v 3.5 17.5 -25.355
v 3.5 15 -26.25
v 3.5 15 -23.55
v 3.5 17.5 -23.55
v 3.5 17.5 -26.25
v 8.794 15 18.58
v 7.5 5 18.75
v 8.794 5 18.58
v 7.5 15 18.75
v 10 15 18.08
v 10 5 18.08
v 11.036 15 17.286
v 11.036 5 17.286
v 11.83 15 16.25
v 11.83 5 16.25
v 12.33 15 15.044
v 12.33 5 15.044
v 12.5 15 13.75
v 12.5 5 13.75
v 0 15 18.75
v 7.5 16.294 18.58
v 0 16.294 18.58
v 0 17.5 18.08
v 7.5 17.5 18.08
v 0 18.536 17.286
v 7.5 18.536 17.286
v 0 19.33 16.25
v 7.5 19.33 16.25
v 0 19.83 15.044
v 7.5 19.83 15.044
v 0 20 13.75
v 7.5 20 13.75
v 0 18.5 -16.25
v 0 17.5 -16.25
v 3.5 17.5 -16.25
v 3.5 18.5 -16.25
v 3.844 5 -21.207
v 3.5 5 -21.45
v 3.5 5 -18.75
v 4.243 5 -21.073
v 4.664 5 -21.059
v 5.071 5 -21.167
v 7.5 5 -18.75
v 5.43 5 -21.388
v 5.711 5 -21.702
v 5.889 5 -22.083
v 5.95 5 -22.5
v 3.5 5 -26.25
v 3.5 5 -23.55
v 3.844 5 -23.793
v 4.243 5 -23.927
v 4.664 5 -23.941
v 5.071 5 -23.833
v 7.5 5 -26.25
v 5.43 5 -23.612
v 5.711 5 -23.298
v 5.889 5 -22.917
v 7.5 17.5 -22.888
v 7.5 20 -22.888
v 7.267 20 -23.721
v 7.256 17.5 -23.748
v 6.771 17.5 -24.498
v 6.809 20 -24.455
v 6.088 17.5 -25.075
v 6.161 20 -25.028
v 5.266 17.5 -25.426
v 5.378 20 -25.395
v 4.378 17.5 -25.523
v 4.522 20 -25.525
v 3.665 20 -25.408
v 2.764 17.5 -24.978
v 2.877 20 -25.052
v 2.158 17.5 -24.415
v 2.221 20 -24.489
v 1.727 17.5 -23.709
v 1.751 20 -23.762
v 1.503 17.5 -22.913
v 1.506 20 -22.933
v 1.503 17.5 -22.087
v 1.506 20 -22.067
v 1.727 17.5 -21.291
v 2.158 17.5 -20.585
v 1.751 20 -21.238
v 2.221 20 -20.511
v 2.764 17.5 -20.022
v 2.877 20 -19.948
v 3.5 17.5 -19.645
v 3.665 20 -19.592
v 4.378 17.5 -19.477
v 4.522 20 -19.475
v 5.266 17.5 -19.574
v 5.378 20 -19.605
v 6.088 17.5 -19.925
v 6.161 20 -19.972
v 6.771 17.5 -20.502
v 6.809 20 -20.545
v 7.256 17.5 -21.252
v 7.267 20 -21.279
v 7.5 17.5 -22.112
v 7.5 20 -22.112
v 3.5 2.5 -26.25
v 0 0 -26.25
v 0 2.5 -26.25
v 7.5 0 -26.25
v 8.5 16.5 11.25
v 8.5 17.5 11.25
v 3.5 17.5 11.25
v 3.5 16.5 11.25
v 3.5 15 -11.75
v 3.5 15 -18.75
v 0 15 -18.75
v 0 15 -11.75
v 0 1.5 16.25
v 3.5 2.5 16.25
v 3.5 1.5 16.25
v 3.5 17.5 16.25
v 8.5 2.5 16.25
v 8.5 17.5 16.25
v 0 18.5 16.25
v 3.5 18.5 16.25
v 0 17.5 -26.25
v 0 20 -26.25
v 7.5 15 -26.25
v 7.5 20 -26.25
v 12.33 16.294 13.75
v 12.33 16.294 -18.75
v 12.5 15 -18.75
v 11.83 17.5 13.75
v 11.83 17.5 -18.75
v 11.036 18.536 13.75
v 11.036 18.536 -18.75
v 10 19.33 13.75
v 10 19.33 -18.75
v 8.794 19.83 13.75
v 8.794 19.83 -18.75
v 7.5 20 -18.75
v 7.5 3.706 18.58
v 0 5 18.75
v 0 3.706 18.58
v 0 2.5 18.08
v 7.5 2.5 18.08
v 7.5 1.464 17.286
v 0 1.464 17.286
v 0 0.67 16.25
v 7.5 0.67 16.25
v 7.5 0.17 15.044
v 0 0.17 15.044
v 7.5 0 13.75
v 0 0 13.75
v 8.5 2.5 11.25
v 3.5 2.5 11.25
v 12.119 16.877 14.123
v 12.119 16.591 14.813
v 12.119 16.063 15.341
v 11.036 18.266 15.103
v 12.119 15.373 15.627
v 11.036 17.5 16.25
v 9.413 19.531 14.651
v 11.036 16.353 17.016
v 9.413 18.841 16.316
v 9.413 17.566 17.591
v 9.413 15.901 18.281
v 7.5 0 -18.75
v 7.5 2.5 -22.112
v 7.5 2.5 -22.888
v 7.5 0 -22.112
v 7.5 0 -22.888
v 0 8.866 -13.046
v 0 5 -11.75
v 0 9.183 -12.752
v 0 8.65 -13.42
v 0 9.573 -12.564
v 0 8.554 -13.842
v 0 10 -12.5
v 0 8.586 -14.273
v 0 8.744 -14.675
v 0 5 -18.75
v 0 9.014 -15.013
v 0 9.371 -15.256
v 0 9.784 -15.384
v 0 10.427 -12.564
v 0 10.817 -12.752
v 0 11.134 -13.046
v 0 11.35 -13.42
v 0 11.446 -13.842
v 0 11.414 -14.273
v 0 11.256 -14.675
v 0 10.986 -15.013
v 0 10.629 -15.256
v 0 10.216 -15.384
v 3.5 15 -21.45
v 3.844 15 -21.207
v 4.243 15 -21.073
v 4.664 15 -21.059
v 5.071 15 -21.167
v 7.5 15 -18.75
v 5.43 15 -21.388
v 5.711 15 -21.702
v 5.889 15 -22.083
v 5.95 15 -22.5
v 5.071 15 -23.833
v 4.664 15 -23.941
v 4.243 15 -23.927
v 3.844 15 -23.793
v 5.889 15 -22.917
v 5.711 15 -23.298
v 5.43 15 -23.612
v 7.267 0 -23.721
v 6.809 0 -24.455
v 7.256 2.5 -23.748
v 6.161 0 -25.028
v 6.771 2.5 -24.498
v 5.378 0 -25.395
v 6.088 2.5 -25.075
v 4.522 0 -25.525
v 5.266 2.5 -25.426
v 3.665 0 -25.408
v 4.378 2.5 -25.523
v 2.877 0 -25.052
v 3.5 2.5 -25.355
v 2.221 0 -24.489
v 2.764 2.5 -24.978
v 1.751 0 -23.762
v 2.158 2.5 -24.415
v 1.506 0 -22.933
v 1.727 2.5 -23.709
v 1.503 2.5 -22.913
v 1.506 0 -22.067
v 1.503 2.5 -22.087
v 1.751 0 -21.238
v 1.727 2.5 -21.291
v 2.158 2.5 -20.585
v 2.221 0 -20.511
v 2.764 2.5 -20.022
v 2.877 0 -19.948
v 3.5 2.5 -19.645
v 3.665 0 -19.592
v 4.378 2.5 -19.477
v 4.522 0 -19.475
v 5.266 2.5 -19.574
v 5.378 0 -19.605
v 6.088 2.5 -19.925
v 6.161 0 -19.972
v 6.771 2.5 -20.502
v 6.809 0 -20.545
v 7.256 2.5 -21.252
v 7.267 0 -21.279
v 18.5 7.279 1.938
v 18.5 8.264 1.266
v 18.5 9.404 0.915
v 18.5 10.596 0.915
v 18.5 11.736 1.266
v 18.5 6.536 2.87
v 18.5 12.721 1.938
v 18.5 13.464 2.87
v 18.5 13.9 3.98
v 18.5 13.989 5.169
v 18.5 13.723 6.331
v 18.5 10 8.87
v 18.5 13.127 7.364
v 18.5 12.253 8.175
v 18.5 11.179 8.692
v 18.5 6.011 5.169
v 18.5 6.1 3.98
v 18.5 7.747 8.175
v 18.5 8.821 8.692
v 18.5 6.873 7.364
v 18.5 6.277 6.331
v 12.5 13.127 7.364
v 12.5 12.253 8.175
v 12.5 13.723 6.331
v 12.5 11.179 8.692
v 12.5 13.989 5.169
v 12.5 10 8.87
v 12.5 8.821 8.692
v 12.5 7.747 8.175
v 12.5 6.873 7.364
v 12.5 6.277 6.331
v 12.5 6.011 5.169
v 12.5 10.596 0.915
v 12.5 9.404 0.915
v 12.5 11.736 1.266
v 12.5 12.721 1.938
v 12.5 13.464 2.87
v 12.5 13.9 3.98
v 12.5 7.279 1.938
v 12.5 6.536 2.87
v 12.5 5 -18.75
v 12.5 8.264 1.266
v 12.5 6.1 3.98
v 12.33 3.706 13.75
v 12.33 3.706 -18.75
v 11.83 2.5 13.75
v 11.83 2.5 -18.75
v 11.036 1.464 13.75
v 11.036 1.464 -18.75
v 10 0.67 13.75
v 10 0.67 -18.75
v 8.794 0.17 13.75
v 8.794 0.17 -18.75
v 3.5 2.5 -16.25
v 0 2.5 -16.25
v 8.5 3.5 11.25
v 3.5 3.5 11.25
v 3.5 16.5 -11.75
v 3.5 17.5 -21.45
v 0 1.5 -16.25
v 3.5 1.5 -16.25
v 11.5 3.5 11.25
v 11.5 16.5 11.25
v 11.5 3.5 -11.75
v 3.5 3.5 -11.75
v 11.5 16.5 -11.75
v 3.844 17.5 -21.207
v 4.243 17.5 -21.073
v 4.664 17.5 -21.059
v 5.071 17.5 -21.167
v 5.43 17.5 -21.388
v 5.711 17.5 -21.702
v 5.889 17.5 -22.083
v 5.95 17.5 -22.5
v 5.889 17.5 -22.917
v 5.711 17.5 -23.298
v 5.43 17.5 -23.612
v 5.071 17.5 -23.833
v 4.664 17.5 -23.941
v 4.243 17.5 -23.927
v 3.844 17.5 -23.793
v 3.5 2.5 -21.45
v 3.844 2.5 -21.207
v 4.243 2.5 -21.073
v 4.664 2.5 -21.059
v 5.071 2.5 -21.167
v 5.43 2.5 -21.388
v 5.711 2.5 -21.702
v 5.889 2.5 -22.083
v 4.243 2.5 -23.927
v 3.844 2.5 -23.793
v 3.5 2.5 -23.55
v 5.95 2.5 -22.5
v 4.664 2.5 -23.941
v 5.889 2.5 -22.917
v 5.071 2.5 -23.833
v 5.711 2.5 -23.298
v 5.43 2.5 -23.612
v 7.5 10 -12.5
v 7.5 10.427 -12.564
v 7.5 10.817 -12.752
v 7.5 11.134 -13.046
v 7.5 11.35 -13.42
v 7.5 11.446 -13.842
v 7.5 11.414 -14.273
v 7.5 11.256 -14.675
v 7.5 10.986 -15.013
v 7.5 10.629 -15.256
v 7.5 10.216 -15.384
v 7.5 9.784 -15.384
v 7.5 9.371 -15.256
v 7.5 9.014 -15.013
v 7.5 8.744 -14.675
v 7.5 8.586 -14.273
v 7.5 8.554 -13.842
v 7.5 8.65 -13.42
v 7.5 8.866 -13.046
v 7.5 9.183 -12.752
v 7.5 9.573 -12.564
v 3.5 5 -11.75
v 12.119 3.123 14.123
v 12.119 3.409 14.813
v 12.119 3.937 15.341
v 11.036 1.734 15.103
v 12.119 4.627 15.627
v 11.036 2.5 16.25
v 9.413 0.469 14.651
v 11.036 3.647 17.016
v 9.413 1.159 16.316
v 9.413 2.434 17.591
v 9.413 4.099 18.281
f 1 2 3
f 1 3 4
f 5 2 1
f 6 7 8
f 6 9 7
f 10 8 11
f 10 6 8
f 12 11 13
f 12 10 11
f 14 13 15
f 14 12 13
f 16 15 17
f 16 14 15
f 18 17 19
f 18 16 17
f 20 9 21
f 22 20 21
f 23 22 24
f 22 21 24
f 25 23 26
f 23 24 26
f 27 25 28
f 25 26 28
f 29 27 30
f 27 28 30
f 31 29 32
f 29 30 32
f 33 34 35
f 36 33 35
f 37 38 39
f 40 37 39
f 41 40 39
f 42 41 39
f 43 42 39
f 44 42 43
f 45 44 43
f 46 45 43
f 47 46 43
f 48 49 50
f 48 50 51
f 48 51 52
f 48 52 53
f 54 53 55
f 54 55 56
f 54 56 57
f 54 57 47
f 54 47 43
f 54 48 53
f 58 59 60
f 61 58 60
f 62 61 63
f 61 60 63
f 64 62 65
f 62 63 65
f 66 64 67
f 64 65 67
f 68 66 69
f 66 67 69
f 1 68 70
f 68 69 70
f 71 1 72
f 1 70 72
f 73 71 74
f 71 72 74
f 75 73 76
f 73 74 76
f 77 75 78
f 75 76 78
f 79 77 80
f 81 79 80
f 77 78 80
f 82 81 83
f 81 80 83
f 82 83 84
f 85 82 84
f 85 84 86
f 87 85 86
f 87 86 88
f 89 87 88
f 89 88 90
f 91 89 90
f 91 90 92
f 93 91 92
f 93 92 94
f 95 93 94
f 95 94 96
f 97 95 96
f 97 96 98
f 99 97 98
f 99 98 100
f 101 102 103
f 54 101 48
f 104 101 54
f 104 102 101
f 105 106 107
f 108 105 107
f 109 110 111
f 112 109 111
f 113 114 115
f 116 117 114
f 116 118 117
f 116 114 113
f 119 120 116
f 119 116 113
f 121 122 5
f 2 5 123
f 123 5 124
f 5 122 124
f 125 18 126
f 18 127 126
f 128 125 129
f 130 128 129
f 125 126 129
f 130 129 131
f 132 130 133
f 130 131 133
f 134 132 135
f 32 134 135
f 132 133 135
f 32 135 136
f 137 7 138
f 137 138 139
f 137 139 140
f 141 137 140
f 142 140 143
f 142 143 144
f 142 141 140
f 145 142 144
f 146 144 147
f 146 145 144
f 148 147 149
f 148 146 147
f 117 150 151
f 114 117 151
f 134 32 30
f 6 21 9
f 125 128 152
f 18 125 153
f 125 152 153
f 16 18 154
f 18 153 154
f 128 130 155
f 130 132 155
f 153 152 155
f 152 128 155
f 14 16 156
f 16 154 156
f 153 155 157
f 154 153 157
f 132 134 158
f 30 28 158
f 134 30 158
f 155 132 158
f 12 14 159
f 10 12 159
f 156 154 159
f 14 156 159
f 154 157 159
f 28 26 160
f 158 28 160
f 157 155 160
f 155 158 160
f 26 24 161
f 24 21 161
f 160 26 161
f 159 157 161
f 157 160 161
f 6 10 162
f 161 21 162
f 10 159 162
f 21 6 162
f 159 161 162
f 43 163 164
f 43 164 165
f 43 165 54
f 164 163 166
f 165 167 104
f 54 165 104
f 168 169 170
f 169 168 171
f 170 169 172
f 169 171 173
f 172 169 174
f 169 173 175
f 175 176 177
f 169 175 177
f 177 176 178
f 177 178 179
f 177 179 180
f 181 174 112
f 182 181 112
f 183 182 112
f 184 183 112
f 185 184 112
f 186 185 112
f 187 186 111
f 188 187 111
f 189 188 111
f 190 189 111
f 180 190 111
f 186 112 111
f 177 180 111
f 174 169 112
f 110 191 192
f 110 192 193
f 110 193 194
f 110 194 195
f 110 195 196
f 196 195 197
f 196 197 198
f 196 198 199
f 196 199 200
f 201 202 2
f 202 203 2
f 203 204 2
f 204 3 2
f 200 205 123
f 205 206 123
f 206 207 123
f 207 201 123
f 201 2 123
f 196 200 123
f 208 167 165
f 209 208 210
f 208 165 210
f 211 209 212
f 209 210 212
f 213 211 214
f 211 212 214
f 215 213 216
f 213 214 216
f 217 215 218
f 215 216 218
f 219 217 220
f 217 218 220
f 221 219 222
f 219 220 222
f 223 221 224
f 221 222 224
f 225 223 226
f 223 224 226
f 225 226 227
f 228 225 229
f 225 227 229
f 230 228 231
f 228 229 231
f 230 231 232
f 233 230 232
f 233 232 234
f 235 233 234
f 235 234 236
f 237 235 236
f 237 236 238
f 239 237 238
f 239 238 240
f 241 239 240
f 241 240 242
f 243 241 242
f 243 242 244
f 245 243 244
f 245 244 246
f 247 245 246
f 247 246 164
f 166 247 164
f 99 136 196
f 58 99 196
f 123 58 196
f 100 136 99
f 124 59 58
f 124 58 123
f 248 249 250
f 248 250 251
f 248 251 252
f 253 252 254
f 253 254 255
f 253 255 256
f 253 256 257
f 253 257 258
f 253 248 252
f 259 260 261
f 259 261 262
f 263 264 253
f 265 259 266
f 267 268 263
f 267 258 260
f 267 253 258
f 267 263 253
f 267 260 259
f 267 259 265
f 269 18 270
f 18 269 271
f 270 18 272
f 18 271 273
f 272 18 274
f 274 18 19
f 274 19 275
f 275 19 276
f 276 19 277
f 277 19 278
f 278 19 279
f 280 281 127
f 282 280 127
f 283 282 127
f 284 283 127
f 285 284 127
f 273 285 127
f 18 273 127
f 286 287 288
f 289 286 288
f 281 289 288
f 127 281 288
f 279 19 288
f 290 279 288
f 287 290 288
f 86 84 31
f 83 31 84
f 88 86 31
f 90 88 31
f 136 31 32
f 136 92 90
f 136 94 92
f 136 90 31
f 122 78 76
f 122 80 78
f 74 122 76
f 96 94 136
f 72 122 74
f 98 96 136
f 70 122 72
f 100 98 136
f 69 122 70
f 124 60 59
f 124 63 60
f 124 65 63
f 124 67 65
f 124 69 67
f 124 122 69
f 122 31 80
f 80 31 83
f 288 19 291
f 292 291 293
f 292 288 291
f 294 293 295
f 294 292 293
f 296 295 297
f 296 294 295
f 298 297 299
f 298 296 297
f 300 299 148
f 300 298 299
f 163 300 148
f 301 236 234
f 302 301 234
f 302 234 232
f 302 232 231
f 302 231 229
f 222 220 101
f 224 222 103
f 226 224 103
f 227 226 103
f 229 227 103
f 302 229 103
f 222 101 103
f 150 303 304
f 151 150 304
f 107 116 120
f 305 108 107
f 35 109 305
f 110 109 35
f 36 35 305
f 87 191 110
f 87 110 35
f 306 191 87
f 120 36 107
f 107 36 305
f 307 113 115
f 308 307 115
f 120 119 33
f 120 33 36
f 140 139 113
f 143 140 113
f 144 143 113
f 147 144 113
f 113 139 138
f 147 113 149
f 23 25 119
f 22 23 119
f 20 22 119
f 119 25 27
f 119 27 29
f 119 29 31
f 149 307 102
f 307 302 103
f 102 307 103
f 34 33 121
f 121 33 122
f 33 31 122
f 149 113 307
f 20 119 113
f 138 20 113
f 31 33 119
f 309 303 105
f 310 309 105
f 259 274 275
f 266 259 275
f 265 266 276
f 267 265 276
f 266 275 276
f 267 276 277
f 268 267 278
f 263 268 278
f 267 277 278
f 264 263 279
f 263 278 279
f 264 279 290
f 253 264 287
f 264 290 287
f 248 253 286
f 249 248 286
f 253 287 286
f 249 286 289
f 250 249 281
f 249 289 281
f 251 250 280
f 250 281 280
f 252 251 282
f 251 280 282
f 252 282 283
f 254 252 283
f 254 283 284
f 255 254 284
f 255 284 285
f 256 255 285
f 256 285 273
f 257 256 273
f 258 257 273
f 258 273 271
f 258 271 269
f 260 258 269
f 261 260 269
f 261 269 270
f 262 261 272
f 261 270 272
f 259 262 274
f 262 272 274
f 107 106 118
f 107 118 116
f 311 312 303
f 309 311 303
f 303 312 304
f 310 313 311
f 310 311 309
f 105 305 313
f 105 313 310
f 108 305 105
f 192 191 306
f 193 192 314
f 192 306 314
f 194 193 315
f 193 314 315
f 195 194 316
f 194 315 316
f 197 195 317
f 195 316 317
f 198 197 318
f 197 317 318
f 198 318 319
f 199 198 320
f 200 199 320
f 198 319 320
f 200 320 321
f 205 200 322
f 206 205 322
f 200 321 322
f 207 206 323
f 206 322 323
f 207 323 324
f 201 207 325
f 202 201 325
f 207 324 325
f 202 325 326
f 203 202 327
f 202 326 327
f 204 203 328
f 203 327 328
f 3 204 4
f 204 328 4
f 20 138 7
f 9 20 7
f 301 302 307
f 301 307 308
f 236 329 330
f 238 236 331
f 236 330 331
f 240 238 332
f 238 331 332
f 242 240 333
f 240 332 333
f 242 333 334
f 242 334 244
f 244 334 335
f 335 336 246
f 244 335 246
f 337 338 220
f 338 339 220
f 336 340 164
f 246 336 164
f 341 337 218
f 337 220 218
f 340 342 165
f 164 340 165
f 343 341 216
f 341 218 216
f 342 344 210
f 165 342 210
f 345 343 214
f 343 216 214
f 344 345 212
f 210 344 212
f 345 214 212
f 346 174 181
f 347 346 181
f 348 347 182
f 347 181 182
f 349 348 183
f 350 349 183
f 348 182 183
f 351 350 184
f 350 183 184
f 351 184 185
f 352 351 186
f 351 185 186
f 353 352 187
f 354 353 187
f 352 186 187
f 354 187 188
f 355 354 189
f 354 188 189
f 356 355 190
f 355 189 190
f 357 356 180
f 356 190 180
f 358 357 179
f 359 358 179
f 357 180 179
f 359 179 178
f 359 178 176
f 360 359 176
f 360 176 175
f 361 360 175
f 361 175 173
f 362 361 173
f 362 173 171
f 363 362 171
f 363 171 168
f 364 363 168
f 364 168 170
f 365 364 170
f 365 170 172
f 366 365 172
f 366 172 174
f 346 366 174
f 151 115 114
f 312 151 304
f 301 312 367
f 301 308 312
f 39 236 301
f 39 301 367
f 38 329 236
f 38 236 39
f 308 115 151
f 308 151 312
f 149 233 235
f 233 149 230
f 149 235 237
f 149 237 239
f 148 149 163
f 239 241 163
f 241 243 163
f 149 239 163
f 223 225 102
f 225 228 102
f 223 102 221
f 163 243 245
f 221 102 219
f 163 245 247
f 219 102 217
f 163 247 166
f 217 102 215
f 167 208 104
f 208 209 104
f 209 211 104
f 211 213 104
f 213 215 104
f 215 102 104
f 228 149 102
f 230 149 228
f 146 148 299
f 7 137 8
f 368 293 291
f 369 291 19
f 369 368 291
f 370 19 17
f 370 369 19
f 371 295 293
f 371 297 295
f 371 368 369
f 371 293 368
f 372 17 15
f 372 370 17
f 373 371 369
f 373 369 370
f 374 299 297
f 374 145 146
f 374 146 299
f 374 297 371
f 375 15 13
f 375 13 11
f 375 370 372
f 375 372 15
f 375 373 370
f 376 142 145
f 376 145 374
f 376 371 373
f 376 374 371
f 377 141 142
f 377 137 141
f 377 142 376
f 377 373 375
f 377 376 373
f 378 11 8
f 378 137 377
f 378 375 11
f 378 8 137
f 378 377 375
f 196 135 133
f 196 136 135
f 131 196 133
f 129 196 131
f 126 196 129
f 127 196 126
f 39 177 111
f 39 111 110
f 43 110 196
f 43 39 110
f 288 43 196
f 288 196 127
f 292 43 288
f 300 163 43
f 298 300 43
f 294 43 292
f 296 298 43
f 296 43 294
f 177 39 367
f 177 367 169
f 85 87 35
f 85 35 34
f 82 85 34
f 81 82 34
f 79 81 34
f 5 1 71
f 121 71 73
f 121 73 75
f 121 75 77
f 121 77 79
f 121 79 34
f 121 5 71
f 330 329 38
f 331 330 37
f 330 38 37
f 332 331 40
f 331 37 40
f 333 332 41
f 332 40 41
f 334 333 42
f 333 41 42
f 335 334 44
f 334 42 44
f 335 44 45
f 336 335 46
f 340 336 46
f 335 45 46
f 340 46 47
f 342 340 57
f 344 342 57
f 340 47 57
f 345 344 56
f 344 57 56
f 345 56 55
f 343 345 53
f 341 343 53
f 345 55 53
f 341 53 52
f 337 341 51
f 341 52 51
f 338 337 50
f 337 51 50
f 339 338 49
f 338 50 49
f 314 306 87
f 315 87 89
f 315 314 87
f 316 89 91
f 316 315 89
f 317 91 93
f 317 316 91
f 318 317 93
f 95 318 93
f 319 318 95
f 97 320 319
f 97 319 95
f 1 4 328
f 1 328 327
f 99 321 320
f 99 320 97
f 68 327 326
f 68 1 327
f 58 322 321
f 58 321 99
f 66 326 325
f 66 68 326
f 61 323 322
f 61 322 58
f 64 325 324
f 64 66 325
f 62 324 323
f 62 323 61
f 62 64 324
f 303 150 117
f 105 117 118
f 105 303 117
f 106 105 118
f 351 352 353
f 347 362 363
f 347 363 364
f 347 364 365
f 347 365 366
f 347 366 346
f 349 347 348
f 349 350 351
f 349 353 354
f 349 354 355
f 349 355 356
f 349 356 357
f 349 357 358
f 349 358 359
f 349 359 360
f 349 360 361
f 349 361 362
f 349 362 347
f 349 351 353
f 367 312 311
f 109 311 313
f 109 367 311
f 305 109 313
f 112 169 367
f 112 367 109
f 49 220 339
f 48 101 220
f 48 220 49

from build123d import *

# Parameters (mm, degrees)
SKETCH_1_W           = 25
SKETCH_1_H           = 37.5
EXTRUDE_1_DEPTH      = 20
FILLET_1_R           = 5
SKETCH_2_W           = 15
SKETCH_2_H           = 7.5
EXTRUDE_2_DEPTH      = 5
EXTRUDE_START        = -20
SKETCH_2_2_W         = 15
SKETCH_2_2_H         = 7.5
EXTRUDE_3_DEPTH      = 5
SKETCH_3_R           = 1.45
CUT_EXTRUDE_1_DEPTH  = 20
SKETCH_4_R           = 3.025
CUT_EXTRUDE_3_DEPTH  = 2.5
CUT_EXTRUDE_START    = -17.5
SKETCH_4_2_R         = 3.025
CUT_EXTRUDE_4_DEPTH  = 2.5
SKETCH_5_W           = 33
SKETCH_5_H           = 13
CUT_EXTRUDE_5_DEPTH  = 5.5
SKETCH_6_W           = 23
SKETCH_6_H           = 13
CUT_EXTRUDE_6_DEPTH  = 18.5
SKETCH_7_R           = 1.45
CUT_EXTRUDE_7_DEPTH  = 14.5
SKETCH_8_W           = 7
SKETCH_8_H           = 2.5
CUT_EXTRUDE_8_DEPTH  = 42.5
SKETCH_9_W           = 12
SKETCH_9_H           = 15
CUT_EXTRUDE_9_DEPTH  = 5
SKETCH_10_W          = 7
SKETCH_10_H          = 32.5
CUT_EXTRUDE_10_DEPTH = 1
CUT_EXTRUDE_START_2  = 15
SKETCH_10_2_W        = 7
SKETCH_10_2_H        = 32.5
CUT_EXTRUDE_11_DEPTH = 1
CUT_EXTRUDE_12_REACH = 40.332
SKETCH_11_R          = 3
SKETCH_12_R          = 4
EXTRUDE_4_DEPTH      = 6
SKETCH_13_W          = 15.131342966
SKETCH_13_H          = 46.669139603
CUT_EXTRUDE_13_DEPTH = 23


with BuildPart() as part:
    # Эскиз1 → Бобышка-Вытянуть1 (new body)
    with BuildSketch(Plane(origin=(0, 0, 0), x_dir=(1, 0, 0), z_dir=(0, 1, 0))):
        Rectangle(SKETCH_1_W, SKETCH_1_H)
    extrude(amount=EXTRUDE_1_DEPTH)

    # Скругление1
    fillet_1_edges = [part.edges().sort_by_distance(p)[0] for p in [
        (-12.5, 20, 0),
        (0, 20, 18.75),
        (12.5, 20, 0),
        (0, 0, 18.75),
        (-12.5, 0, 0),
        (12.5, 0, 0),
        (12.5, 10, 18.75),
        (-12.5, 10, 18.75),
    ]]
    fillet(fillet_1_edges, radius=FILLET_1_R)

    # Эскиз2 → Бобышка-Вытянуть2 (add)
    with BuildSketch(Plane(origin=(0, 20, 0), x_dir=(1, 0, 0), z_dir=(0, 1, 0))):
        with Locations((0, 22.5)):
            Rectangle(SKETCH_2_W, SKETCH_2_H)
    extrude(amount=-EXTRUDE_2_DEPTH)

    # Эскиз2<2> → Бобышка-Вытянуть3 (add)
    with BuildSketch(Plane(origin=(0, 20, 0), x_dir=(1, 0, 0), z_dir=(0, 1, 0)).offset(EXTRUDE_START)):
        with Locations((0, 22.5)):
            Rectangle(SKETCH_2_2_W, SKETCH_2_2_H)
    extrude(amount=EXTRUDE_3_DEPTH)

    # Эскиз3 → Вырез-Вытянуть1 (cut)
    with BuildSketch(Plane(origin=(0, 20, 0), x_dir=(1, 0, 0), z_dir=(0, 1, 0))):
        with Locations(Location((-4.5, 22.5, 0), (0, 0, 270))):
            Circle(SKETCH_3_R)
        with Locations(Location((4.5, 22.5, 0), (0, 0, 270))):
            Circle(SKETCH_3_R)
    extrude(amount=-CUT_EXTRUDE_1_DEPTH, mode=Mode.SUBTRACT)

    # Эскиз4 → Вырез-Вытянуть3 (cut)
    with BuildSketch(Plane(origin=(0, 20, 0), x_dir=(1, 0, 0), z_dir=(0, 1, 0))):
        with Locations((-4.5, 22.5)):
            Circle(SKETCH_4_R)
        with Locations((4.5, 22.5)):
            Circle(SKETCH_4_R)
    extrude(amount=-CUT_EXTRUDE_3_DEPTH, mode=Mode.SUBTRACT)

    # Эскиз4<2> → Вырез-Вытянуть4 (cut)
    with BuildSketch(Plane(origin=(0, 20, 0), x_dir=(1, 0, 0), z_dir=(0, 1, 0)).offset(CUT_EXTRUDE_START)):
        with Locations((-4.5, 22.5)):
            Circle(SKETCH_4_2_R)
        with Locations((4.5, 22.5)):
            Circle(SKETCH_4_2_R)
    extrude(amount=-CUT_EXTRUDE_4_DEPTH, mode=Mode.SUBTRACT)

    # Эскиз5 → Вырез-Вытянуть5 (cut)
    with BuildSketch(Plane.ZY.offset(12.5)):
        with Locations((-0.25, 10)):
            Rectangle(SKETCH_5_W, SKETCH_5_H)
    extrude(amount=-CUT_EXTRUDE_5_DEPTH, mode=Mode.SUBTRACT)

    # Эскиз6 → Вырез-Вытянуть6 (cut)
    with BuildSketch(Plane.ZY.offset(7)):
        with Locations((-0.25, 10)):
            Rectangle(SKETCH_6_W, SKETCH_6_H)
    extrude(amount=-CUT_EXTRUDE_6_DEPTH, mode=Mode.SUBTRACT)

    # Эскиз7 → Вырез-Вытянуть7 (cut)
    with BuildSketch(Plane.ZY.offset(7)):
        with Locations((-13.95, 10)):
            Circle(SKETCH_7_R)
        with Locations((13.45, 10)):
            Circle(SKETCH_7_R)
    extrude(amount=-CUT_EXTRUDE_7_DEPTH, mode=Mode.SUBTRACT)

    # Эскиз8 → Вырез-Вытянуть8 (cut)
    with BuildSketch(Plane(origin=(0, 0, -26.25), x_dir=(-1, 0, 0), z_dir=(0, 0, -1))):
        with Locations((0, 16.25)):
            Rectangle(SKETCH_8_W, SKETCH_8_H)
        with Locations((0, 3.75)):
            Rectangle(SKETCH_8_W, SKETCH_8_H)
    extrude(amount=-CUT_EXTRUDE_8_DEPTH, mode=Mode.SUBTRACT)

    # Эскиз9 → Вырез-Вытянуть9 (cut)
    with BuildSketch(Plane(origin=(0, 0, 11.25), x_dir=(-1, 0, 0), z_dir=(0, 0, -1))):
        with Locations((-2.5, 10)):
            Rectangle(SKETCH_9_W, SKETCH_9_H)
    extrude(amount=-CUT_EXTRUDE_9_DEPTH, mode=Mode.SUBTRACT)

    # Эскиз10 → Вырез-Вытянуть10 (cut)
    with BuildSketch(Plane.XZ.offset(-17.5)):
        Rectangle(SKETCH_10_W, SKETCH_10_H)
    extrude(amount=-CUT_EXTRUDE_10_DEPTH, mode=Mode.SUBTRACT)

    # Эскиз10<2> → Вырез-Вытянуть11 (cut)
    with BuildSketch(Plane.XZ.offset(-17.5).offset(CUT_EXTRUDE_START_2)):
        Rectangle(SKETCH_10_2_W, SKETCH_10_2_H)
    extrude(amount=CUT_EXTRUDE_11_DEPTH, mode=Mode.SUBTRACT)

    # Вырез-Вытянуть12: up to this face of the body (flat: up to its plane)
    cut_extrude_12_end = Plane(part.part.faces().sort_by_distance((-12.5, 10, -17.75))[0])
    # Эскиз11 → Вырез-Вытянуть12 (cut, up to the picked face)
    with BuildSketch(Plane.ZY.offset(7), mode=Mode.PRIVATE) as cut_extrude_12_sk1:
        with Locations((-13.95, 10)):
            Circle(SKETCH_11_R)
    cut_extrude_12_tool1 = split(extrude(cut_extrude_12_sk1.sketch, amount=CUT_EXTRUDE_12_REACH, mode=Mode.PRIVATE), bisect_by=cut_extrude_12_end, keep=Keep.BOTH, mode=Mode.PRIVATE)
    # Эскиз11 → Вырез-Вытянуть12 (cut, up to the picked face)
    with BuildSketch(Plane.ZY.offset(7), mode=Mode.PRIVATE) as cut_extrude_12_sk2:
        with Locations((13.45, 10)):
            Circle(SKETCH_11_R)
    cut_extrude_12_tool2 = split(extrude(cut_extrude_12_sk2.sketch, amount=CUT_EXTRUDE_12_REACH, mode=Mode.PRIVATE), bisect_by=cut_extrude_12_end, keep=Keep.BOTH, mode=Mode.PRIVATE)
    add(cut_extrude_12_tool1.solids().sort_by(Axis((-7, 10, -13.95), (-1, 0, 0)))[0], mode=Mode.SUBTRACT)
    add(cut_extrude_12_tool2.solids().sort_by(Axis((-7, 10, 13.45), (-1, 0, 0)))[0], mode=Mode.SUBTRACT)

    # Эскиз12 → Бобышка-Вытянуть4 (add)
    with BuildSketch(Plane(origin=(12.5, 0, 0), x_dir=(0, 0, -1), z_dir=(1, 0, 0))):
        with Locations(Location((-4.87, 10, 0), (0, 0, 180))):
            Circle(SKETCH_12_R)
    extrude(amount=EXTRUDE_4_DEPTH)

    # Эскиз13 → Вырез-Вытянуть13 (cut)
    with BuildSketch(Plane(origin=(0, 20, 0), x_dir=(1, 0, 0), z_dir=(0, 1, 0))):
        with Locations((-7.565671483, 2.915430198)):
            Rectangle(SKETCH_13_W, SKETCH_13_H)
    extrude(amount=-CUT_EXTRUDE_13_DEPTH, mode=Mode.SUBTRACT)


solid = part.part
